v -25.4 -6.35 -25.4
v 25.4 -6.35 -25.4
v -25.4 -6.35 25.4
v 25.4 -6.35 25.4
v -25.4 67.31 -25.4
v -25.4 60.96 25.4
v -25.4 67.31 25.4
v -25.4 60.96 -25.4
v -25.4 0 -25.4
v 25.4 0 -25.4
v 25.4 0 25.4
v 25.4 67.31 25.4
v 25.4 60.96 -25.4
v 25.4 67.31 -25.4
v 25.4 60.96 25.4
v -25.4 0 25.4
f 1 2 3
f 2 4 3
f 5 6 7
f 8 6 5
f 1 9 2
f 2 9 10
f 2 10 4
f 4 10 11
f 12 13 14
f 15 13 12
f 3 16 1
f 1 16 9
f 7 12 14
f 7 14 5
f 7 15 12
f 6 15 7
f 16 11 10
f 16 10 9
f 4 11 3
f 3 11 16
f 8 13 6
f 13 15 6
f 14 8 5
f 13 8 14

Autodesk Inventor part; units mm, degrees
ref_plane "YZ Plane" through (0, 0, 0) normal (1, 0, 0) x (0, 1, 0)
ref_plane "XY Plane" through (0, 0, 0) normal (0, 0, 1) x (1, 0, 0)
sketch "Sketch1" plane through (0, 0, 0) normal (0, 1, 0) x (-1, 0, 0)
  line L0 (-25.4, 25.4) -> (25.4, 25.4)
  line L1 (25.4, 25.4) -> (25.4, -25.4)
  line L2 (25.4, -25.4) -> (-25.4, -25.4)
  line L3 (-25.4, -25.4) -> (-25.4, 25.4)
  line L4 (-25.4, 25.4) -> (25.4, -25.4) construction
  line L5 (25.4, 25.4) -> (-25.4, -25.4) construction
  point P0 (0, 0)
  dimension "d0" = 50.8
  dimension "d1" = 50.8
extrude "Extrusion1" add sketch "Sketch1" against normal blind 6.35
ref_plane "Work Plane1" through (0, 60.96, 0) normal (0, 1, 0) x (-1, 0, 0)
sketch "Sketch2" plane through (0, 60.96, 0) normal (0, 1, 0) x (-1, 0, 0)
  line L0 (-25.4, 25.4) -> (25.4, 25.4) projected
  line L1 (-25.4, -25.4) -> (-25.4, 25.4) projected
  line L2 (25.4, -25.4) -> (-25.4, -25.4) projected
  line L3 (25.4, 25.4) -> (25.4, -25.4) projected
  point P0 (0, 0)
extrude "Extrusion2" add sketch "Sketch2" along normal blind 6.35
properties part number "Floor"
